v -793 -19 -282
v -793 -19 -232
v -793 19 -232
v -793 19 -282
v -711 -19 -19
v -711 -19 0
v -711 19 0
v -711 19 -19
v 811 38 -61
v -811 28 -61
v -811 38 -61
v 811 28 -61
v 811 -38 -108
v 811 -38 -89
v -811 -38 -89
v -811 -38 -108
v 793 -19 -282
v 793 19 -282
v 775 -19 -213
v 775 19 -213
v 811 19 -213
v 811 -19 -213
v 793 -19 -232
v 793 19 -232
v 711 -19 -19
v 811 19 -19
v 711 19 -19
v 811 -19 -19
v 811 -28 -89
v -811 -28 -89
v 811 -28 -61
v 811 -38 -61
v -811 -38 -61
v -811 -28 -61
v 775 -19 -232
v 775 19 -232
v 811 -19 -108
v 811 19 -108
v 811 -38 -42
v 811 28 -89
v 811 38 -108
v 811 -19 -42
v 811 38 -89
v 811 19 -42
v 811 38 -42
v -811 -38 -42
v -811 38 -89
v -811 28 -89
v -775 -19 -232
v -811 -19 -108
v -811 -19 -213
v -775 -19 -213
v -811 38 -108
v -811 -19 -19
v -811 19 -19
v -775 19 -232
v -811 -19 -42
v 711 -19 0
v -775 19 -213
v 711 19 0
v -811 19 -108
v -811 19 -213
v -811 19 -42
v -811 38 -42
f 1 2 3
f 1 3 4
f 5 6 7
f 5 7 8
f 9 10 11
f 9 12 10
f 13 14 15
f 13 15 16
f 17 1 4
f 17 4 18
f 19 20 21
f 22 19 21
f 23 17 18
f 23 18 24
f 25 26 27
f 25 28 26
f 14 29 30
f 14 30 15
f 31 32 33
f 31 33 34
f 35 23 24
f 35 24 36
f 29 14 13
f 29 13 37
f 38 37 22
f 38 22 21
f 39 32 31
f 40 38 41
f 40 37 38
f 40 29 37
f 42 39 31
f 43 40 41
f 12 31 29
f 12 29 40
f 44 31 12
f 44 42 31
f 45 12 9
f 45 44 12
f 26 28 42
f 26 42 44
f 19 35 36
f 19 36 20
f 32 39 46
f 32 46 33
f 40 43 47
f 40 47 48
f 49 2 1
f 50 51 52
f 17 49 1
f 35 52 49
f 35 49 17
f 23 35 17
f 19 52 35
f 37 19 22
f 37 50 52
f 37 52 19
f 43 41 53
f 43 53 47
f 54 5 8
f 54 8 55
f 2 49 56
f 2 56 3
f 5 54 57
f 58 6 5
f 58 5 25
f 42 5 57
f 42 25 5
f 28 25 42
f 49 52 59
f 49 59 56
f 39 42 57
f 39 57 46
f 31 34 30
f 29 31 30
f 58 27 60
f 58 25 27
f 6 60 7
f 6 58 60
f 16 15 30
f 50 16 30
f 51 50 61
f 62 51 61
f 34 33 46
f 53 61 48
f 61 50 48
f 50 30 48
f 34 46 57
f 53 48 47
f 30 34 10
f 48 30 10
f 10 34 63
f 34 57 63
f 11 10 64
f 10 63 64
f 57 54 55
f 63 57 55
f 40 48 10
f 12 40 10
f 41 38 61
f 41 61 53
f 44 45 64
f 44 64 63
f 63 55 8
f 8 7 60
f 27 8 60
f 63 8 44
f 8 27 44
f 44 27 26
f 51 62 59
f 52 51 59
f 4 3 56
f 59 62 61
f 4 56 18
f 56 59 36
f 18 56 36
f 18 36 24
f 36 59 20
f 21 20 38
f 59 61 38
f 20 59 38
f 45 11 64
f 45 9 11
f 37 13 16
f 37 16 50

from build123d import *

# Parameters (mm, degrees)
F1_DEPTH = 19
F3_DEPTH = 811


with BuildPart() as f1:
    # F0 (on Front) → F1 (new body, symmetric)
    with BuildSketch(Plane.XZ):
        Polygon((711, 0), (0, 0), (-711, 0), (-711, -19), (-811, -19), (-811, -213), (-775, -213), (-775, -232), (-793, -232), (-793, -282), (0, -282), (793, -282), (793, -232), (775, -232), (775, -213), (811, -213), (811, -19), (711, -19), align=None)
    extrude(amount=F1_DEPTH, both=True)

    # F2 (on Right) → F3 (join, symmetric)
    with BuildSketch(Plane.YZ):
        Polygon((38, -42), (-38, -42), (-38, -61), (-28, -61), (-28, -89), (-38, -89), (-38, -108), (38, -108), (38, -89), (28, -89), (28, -61), (38, -61), align=None)
    extrude(amount=F3_DEPTH, both=True)


solid = f1.part
